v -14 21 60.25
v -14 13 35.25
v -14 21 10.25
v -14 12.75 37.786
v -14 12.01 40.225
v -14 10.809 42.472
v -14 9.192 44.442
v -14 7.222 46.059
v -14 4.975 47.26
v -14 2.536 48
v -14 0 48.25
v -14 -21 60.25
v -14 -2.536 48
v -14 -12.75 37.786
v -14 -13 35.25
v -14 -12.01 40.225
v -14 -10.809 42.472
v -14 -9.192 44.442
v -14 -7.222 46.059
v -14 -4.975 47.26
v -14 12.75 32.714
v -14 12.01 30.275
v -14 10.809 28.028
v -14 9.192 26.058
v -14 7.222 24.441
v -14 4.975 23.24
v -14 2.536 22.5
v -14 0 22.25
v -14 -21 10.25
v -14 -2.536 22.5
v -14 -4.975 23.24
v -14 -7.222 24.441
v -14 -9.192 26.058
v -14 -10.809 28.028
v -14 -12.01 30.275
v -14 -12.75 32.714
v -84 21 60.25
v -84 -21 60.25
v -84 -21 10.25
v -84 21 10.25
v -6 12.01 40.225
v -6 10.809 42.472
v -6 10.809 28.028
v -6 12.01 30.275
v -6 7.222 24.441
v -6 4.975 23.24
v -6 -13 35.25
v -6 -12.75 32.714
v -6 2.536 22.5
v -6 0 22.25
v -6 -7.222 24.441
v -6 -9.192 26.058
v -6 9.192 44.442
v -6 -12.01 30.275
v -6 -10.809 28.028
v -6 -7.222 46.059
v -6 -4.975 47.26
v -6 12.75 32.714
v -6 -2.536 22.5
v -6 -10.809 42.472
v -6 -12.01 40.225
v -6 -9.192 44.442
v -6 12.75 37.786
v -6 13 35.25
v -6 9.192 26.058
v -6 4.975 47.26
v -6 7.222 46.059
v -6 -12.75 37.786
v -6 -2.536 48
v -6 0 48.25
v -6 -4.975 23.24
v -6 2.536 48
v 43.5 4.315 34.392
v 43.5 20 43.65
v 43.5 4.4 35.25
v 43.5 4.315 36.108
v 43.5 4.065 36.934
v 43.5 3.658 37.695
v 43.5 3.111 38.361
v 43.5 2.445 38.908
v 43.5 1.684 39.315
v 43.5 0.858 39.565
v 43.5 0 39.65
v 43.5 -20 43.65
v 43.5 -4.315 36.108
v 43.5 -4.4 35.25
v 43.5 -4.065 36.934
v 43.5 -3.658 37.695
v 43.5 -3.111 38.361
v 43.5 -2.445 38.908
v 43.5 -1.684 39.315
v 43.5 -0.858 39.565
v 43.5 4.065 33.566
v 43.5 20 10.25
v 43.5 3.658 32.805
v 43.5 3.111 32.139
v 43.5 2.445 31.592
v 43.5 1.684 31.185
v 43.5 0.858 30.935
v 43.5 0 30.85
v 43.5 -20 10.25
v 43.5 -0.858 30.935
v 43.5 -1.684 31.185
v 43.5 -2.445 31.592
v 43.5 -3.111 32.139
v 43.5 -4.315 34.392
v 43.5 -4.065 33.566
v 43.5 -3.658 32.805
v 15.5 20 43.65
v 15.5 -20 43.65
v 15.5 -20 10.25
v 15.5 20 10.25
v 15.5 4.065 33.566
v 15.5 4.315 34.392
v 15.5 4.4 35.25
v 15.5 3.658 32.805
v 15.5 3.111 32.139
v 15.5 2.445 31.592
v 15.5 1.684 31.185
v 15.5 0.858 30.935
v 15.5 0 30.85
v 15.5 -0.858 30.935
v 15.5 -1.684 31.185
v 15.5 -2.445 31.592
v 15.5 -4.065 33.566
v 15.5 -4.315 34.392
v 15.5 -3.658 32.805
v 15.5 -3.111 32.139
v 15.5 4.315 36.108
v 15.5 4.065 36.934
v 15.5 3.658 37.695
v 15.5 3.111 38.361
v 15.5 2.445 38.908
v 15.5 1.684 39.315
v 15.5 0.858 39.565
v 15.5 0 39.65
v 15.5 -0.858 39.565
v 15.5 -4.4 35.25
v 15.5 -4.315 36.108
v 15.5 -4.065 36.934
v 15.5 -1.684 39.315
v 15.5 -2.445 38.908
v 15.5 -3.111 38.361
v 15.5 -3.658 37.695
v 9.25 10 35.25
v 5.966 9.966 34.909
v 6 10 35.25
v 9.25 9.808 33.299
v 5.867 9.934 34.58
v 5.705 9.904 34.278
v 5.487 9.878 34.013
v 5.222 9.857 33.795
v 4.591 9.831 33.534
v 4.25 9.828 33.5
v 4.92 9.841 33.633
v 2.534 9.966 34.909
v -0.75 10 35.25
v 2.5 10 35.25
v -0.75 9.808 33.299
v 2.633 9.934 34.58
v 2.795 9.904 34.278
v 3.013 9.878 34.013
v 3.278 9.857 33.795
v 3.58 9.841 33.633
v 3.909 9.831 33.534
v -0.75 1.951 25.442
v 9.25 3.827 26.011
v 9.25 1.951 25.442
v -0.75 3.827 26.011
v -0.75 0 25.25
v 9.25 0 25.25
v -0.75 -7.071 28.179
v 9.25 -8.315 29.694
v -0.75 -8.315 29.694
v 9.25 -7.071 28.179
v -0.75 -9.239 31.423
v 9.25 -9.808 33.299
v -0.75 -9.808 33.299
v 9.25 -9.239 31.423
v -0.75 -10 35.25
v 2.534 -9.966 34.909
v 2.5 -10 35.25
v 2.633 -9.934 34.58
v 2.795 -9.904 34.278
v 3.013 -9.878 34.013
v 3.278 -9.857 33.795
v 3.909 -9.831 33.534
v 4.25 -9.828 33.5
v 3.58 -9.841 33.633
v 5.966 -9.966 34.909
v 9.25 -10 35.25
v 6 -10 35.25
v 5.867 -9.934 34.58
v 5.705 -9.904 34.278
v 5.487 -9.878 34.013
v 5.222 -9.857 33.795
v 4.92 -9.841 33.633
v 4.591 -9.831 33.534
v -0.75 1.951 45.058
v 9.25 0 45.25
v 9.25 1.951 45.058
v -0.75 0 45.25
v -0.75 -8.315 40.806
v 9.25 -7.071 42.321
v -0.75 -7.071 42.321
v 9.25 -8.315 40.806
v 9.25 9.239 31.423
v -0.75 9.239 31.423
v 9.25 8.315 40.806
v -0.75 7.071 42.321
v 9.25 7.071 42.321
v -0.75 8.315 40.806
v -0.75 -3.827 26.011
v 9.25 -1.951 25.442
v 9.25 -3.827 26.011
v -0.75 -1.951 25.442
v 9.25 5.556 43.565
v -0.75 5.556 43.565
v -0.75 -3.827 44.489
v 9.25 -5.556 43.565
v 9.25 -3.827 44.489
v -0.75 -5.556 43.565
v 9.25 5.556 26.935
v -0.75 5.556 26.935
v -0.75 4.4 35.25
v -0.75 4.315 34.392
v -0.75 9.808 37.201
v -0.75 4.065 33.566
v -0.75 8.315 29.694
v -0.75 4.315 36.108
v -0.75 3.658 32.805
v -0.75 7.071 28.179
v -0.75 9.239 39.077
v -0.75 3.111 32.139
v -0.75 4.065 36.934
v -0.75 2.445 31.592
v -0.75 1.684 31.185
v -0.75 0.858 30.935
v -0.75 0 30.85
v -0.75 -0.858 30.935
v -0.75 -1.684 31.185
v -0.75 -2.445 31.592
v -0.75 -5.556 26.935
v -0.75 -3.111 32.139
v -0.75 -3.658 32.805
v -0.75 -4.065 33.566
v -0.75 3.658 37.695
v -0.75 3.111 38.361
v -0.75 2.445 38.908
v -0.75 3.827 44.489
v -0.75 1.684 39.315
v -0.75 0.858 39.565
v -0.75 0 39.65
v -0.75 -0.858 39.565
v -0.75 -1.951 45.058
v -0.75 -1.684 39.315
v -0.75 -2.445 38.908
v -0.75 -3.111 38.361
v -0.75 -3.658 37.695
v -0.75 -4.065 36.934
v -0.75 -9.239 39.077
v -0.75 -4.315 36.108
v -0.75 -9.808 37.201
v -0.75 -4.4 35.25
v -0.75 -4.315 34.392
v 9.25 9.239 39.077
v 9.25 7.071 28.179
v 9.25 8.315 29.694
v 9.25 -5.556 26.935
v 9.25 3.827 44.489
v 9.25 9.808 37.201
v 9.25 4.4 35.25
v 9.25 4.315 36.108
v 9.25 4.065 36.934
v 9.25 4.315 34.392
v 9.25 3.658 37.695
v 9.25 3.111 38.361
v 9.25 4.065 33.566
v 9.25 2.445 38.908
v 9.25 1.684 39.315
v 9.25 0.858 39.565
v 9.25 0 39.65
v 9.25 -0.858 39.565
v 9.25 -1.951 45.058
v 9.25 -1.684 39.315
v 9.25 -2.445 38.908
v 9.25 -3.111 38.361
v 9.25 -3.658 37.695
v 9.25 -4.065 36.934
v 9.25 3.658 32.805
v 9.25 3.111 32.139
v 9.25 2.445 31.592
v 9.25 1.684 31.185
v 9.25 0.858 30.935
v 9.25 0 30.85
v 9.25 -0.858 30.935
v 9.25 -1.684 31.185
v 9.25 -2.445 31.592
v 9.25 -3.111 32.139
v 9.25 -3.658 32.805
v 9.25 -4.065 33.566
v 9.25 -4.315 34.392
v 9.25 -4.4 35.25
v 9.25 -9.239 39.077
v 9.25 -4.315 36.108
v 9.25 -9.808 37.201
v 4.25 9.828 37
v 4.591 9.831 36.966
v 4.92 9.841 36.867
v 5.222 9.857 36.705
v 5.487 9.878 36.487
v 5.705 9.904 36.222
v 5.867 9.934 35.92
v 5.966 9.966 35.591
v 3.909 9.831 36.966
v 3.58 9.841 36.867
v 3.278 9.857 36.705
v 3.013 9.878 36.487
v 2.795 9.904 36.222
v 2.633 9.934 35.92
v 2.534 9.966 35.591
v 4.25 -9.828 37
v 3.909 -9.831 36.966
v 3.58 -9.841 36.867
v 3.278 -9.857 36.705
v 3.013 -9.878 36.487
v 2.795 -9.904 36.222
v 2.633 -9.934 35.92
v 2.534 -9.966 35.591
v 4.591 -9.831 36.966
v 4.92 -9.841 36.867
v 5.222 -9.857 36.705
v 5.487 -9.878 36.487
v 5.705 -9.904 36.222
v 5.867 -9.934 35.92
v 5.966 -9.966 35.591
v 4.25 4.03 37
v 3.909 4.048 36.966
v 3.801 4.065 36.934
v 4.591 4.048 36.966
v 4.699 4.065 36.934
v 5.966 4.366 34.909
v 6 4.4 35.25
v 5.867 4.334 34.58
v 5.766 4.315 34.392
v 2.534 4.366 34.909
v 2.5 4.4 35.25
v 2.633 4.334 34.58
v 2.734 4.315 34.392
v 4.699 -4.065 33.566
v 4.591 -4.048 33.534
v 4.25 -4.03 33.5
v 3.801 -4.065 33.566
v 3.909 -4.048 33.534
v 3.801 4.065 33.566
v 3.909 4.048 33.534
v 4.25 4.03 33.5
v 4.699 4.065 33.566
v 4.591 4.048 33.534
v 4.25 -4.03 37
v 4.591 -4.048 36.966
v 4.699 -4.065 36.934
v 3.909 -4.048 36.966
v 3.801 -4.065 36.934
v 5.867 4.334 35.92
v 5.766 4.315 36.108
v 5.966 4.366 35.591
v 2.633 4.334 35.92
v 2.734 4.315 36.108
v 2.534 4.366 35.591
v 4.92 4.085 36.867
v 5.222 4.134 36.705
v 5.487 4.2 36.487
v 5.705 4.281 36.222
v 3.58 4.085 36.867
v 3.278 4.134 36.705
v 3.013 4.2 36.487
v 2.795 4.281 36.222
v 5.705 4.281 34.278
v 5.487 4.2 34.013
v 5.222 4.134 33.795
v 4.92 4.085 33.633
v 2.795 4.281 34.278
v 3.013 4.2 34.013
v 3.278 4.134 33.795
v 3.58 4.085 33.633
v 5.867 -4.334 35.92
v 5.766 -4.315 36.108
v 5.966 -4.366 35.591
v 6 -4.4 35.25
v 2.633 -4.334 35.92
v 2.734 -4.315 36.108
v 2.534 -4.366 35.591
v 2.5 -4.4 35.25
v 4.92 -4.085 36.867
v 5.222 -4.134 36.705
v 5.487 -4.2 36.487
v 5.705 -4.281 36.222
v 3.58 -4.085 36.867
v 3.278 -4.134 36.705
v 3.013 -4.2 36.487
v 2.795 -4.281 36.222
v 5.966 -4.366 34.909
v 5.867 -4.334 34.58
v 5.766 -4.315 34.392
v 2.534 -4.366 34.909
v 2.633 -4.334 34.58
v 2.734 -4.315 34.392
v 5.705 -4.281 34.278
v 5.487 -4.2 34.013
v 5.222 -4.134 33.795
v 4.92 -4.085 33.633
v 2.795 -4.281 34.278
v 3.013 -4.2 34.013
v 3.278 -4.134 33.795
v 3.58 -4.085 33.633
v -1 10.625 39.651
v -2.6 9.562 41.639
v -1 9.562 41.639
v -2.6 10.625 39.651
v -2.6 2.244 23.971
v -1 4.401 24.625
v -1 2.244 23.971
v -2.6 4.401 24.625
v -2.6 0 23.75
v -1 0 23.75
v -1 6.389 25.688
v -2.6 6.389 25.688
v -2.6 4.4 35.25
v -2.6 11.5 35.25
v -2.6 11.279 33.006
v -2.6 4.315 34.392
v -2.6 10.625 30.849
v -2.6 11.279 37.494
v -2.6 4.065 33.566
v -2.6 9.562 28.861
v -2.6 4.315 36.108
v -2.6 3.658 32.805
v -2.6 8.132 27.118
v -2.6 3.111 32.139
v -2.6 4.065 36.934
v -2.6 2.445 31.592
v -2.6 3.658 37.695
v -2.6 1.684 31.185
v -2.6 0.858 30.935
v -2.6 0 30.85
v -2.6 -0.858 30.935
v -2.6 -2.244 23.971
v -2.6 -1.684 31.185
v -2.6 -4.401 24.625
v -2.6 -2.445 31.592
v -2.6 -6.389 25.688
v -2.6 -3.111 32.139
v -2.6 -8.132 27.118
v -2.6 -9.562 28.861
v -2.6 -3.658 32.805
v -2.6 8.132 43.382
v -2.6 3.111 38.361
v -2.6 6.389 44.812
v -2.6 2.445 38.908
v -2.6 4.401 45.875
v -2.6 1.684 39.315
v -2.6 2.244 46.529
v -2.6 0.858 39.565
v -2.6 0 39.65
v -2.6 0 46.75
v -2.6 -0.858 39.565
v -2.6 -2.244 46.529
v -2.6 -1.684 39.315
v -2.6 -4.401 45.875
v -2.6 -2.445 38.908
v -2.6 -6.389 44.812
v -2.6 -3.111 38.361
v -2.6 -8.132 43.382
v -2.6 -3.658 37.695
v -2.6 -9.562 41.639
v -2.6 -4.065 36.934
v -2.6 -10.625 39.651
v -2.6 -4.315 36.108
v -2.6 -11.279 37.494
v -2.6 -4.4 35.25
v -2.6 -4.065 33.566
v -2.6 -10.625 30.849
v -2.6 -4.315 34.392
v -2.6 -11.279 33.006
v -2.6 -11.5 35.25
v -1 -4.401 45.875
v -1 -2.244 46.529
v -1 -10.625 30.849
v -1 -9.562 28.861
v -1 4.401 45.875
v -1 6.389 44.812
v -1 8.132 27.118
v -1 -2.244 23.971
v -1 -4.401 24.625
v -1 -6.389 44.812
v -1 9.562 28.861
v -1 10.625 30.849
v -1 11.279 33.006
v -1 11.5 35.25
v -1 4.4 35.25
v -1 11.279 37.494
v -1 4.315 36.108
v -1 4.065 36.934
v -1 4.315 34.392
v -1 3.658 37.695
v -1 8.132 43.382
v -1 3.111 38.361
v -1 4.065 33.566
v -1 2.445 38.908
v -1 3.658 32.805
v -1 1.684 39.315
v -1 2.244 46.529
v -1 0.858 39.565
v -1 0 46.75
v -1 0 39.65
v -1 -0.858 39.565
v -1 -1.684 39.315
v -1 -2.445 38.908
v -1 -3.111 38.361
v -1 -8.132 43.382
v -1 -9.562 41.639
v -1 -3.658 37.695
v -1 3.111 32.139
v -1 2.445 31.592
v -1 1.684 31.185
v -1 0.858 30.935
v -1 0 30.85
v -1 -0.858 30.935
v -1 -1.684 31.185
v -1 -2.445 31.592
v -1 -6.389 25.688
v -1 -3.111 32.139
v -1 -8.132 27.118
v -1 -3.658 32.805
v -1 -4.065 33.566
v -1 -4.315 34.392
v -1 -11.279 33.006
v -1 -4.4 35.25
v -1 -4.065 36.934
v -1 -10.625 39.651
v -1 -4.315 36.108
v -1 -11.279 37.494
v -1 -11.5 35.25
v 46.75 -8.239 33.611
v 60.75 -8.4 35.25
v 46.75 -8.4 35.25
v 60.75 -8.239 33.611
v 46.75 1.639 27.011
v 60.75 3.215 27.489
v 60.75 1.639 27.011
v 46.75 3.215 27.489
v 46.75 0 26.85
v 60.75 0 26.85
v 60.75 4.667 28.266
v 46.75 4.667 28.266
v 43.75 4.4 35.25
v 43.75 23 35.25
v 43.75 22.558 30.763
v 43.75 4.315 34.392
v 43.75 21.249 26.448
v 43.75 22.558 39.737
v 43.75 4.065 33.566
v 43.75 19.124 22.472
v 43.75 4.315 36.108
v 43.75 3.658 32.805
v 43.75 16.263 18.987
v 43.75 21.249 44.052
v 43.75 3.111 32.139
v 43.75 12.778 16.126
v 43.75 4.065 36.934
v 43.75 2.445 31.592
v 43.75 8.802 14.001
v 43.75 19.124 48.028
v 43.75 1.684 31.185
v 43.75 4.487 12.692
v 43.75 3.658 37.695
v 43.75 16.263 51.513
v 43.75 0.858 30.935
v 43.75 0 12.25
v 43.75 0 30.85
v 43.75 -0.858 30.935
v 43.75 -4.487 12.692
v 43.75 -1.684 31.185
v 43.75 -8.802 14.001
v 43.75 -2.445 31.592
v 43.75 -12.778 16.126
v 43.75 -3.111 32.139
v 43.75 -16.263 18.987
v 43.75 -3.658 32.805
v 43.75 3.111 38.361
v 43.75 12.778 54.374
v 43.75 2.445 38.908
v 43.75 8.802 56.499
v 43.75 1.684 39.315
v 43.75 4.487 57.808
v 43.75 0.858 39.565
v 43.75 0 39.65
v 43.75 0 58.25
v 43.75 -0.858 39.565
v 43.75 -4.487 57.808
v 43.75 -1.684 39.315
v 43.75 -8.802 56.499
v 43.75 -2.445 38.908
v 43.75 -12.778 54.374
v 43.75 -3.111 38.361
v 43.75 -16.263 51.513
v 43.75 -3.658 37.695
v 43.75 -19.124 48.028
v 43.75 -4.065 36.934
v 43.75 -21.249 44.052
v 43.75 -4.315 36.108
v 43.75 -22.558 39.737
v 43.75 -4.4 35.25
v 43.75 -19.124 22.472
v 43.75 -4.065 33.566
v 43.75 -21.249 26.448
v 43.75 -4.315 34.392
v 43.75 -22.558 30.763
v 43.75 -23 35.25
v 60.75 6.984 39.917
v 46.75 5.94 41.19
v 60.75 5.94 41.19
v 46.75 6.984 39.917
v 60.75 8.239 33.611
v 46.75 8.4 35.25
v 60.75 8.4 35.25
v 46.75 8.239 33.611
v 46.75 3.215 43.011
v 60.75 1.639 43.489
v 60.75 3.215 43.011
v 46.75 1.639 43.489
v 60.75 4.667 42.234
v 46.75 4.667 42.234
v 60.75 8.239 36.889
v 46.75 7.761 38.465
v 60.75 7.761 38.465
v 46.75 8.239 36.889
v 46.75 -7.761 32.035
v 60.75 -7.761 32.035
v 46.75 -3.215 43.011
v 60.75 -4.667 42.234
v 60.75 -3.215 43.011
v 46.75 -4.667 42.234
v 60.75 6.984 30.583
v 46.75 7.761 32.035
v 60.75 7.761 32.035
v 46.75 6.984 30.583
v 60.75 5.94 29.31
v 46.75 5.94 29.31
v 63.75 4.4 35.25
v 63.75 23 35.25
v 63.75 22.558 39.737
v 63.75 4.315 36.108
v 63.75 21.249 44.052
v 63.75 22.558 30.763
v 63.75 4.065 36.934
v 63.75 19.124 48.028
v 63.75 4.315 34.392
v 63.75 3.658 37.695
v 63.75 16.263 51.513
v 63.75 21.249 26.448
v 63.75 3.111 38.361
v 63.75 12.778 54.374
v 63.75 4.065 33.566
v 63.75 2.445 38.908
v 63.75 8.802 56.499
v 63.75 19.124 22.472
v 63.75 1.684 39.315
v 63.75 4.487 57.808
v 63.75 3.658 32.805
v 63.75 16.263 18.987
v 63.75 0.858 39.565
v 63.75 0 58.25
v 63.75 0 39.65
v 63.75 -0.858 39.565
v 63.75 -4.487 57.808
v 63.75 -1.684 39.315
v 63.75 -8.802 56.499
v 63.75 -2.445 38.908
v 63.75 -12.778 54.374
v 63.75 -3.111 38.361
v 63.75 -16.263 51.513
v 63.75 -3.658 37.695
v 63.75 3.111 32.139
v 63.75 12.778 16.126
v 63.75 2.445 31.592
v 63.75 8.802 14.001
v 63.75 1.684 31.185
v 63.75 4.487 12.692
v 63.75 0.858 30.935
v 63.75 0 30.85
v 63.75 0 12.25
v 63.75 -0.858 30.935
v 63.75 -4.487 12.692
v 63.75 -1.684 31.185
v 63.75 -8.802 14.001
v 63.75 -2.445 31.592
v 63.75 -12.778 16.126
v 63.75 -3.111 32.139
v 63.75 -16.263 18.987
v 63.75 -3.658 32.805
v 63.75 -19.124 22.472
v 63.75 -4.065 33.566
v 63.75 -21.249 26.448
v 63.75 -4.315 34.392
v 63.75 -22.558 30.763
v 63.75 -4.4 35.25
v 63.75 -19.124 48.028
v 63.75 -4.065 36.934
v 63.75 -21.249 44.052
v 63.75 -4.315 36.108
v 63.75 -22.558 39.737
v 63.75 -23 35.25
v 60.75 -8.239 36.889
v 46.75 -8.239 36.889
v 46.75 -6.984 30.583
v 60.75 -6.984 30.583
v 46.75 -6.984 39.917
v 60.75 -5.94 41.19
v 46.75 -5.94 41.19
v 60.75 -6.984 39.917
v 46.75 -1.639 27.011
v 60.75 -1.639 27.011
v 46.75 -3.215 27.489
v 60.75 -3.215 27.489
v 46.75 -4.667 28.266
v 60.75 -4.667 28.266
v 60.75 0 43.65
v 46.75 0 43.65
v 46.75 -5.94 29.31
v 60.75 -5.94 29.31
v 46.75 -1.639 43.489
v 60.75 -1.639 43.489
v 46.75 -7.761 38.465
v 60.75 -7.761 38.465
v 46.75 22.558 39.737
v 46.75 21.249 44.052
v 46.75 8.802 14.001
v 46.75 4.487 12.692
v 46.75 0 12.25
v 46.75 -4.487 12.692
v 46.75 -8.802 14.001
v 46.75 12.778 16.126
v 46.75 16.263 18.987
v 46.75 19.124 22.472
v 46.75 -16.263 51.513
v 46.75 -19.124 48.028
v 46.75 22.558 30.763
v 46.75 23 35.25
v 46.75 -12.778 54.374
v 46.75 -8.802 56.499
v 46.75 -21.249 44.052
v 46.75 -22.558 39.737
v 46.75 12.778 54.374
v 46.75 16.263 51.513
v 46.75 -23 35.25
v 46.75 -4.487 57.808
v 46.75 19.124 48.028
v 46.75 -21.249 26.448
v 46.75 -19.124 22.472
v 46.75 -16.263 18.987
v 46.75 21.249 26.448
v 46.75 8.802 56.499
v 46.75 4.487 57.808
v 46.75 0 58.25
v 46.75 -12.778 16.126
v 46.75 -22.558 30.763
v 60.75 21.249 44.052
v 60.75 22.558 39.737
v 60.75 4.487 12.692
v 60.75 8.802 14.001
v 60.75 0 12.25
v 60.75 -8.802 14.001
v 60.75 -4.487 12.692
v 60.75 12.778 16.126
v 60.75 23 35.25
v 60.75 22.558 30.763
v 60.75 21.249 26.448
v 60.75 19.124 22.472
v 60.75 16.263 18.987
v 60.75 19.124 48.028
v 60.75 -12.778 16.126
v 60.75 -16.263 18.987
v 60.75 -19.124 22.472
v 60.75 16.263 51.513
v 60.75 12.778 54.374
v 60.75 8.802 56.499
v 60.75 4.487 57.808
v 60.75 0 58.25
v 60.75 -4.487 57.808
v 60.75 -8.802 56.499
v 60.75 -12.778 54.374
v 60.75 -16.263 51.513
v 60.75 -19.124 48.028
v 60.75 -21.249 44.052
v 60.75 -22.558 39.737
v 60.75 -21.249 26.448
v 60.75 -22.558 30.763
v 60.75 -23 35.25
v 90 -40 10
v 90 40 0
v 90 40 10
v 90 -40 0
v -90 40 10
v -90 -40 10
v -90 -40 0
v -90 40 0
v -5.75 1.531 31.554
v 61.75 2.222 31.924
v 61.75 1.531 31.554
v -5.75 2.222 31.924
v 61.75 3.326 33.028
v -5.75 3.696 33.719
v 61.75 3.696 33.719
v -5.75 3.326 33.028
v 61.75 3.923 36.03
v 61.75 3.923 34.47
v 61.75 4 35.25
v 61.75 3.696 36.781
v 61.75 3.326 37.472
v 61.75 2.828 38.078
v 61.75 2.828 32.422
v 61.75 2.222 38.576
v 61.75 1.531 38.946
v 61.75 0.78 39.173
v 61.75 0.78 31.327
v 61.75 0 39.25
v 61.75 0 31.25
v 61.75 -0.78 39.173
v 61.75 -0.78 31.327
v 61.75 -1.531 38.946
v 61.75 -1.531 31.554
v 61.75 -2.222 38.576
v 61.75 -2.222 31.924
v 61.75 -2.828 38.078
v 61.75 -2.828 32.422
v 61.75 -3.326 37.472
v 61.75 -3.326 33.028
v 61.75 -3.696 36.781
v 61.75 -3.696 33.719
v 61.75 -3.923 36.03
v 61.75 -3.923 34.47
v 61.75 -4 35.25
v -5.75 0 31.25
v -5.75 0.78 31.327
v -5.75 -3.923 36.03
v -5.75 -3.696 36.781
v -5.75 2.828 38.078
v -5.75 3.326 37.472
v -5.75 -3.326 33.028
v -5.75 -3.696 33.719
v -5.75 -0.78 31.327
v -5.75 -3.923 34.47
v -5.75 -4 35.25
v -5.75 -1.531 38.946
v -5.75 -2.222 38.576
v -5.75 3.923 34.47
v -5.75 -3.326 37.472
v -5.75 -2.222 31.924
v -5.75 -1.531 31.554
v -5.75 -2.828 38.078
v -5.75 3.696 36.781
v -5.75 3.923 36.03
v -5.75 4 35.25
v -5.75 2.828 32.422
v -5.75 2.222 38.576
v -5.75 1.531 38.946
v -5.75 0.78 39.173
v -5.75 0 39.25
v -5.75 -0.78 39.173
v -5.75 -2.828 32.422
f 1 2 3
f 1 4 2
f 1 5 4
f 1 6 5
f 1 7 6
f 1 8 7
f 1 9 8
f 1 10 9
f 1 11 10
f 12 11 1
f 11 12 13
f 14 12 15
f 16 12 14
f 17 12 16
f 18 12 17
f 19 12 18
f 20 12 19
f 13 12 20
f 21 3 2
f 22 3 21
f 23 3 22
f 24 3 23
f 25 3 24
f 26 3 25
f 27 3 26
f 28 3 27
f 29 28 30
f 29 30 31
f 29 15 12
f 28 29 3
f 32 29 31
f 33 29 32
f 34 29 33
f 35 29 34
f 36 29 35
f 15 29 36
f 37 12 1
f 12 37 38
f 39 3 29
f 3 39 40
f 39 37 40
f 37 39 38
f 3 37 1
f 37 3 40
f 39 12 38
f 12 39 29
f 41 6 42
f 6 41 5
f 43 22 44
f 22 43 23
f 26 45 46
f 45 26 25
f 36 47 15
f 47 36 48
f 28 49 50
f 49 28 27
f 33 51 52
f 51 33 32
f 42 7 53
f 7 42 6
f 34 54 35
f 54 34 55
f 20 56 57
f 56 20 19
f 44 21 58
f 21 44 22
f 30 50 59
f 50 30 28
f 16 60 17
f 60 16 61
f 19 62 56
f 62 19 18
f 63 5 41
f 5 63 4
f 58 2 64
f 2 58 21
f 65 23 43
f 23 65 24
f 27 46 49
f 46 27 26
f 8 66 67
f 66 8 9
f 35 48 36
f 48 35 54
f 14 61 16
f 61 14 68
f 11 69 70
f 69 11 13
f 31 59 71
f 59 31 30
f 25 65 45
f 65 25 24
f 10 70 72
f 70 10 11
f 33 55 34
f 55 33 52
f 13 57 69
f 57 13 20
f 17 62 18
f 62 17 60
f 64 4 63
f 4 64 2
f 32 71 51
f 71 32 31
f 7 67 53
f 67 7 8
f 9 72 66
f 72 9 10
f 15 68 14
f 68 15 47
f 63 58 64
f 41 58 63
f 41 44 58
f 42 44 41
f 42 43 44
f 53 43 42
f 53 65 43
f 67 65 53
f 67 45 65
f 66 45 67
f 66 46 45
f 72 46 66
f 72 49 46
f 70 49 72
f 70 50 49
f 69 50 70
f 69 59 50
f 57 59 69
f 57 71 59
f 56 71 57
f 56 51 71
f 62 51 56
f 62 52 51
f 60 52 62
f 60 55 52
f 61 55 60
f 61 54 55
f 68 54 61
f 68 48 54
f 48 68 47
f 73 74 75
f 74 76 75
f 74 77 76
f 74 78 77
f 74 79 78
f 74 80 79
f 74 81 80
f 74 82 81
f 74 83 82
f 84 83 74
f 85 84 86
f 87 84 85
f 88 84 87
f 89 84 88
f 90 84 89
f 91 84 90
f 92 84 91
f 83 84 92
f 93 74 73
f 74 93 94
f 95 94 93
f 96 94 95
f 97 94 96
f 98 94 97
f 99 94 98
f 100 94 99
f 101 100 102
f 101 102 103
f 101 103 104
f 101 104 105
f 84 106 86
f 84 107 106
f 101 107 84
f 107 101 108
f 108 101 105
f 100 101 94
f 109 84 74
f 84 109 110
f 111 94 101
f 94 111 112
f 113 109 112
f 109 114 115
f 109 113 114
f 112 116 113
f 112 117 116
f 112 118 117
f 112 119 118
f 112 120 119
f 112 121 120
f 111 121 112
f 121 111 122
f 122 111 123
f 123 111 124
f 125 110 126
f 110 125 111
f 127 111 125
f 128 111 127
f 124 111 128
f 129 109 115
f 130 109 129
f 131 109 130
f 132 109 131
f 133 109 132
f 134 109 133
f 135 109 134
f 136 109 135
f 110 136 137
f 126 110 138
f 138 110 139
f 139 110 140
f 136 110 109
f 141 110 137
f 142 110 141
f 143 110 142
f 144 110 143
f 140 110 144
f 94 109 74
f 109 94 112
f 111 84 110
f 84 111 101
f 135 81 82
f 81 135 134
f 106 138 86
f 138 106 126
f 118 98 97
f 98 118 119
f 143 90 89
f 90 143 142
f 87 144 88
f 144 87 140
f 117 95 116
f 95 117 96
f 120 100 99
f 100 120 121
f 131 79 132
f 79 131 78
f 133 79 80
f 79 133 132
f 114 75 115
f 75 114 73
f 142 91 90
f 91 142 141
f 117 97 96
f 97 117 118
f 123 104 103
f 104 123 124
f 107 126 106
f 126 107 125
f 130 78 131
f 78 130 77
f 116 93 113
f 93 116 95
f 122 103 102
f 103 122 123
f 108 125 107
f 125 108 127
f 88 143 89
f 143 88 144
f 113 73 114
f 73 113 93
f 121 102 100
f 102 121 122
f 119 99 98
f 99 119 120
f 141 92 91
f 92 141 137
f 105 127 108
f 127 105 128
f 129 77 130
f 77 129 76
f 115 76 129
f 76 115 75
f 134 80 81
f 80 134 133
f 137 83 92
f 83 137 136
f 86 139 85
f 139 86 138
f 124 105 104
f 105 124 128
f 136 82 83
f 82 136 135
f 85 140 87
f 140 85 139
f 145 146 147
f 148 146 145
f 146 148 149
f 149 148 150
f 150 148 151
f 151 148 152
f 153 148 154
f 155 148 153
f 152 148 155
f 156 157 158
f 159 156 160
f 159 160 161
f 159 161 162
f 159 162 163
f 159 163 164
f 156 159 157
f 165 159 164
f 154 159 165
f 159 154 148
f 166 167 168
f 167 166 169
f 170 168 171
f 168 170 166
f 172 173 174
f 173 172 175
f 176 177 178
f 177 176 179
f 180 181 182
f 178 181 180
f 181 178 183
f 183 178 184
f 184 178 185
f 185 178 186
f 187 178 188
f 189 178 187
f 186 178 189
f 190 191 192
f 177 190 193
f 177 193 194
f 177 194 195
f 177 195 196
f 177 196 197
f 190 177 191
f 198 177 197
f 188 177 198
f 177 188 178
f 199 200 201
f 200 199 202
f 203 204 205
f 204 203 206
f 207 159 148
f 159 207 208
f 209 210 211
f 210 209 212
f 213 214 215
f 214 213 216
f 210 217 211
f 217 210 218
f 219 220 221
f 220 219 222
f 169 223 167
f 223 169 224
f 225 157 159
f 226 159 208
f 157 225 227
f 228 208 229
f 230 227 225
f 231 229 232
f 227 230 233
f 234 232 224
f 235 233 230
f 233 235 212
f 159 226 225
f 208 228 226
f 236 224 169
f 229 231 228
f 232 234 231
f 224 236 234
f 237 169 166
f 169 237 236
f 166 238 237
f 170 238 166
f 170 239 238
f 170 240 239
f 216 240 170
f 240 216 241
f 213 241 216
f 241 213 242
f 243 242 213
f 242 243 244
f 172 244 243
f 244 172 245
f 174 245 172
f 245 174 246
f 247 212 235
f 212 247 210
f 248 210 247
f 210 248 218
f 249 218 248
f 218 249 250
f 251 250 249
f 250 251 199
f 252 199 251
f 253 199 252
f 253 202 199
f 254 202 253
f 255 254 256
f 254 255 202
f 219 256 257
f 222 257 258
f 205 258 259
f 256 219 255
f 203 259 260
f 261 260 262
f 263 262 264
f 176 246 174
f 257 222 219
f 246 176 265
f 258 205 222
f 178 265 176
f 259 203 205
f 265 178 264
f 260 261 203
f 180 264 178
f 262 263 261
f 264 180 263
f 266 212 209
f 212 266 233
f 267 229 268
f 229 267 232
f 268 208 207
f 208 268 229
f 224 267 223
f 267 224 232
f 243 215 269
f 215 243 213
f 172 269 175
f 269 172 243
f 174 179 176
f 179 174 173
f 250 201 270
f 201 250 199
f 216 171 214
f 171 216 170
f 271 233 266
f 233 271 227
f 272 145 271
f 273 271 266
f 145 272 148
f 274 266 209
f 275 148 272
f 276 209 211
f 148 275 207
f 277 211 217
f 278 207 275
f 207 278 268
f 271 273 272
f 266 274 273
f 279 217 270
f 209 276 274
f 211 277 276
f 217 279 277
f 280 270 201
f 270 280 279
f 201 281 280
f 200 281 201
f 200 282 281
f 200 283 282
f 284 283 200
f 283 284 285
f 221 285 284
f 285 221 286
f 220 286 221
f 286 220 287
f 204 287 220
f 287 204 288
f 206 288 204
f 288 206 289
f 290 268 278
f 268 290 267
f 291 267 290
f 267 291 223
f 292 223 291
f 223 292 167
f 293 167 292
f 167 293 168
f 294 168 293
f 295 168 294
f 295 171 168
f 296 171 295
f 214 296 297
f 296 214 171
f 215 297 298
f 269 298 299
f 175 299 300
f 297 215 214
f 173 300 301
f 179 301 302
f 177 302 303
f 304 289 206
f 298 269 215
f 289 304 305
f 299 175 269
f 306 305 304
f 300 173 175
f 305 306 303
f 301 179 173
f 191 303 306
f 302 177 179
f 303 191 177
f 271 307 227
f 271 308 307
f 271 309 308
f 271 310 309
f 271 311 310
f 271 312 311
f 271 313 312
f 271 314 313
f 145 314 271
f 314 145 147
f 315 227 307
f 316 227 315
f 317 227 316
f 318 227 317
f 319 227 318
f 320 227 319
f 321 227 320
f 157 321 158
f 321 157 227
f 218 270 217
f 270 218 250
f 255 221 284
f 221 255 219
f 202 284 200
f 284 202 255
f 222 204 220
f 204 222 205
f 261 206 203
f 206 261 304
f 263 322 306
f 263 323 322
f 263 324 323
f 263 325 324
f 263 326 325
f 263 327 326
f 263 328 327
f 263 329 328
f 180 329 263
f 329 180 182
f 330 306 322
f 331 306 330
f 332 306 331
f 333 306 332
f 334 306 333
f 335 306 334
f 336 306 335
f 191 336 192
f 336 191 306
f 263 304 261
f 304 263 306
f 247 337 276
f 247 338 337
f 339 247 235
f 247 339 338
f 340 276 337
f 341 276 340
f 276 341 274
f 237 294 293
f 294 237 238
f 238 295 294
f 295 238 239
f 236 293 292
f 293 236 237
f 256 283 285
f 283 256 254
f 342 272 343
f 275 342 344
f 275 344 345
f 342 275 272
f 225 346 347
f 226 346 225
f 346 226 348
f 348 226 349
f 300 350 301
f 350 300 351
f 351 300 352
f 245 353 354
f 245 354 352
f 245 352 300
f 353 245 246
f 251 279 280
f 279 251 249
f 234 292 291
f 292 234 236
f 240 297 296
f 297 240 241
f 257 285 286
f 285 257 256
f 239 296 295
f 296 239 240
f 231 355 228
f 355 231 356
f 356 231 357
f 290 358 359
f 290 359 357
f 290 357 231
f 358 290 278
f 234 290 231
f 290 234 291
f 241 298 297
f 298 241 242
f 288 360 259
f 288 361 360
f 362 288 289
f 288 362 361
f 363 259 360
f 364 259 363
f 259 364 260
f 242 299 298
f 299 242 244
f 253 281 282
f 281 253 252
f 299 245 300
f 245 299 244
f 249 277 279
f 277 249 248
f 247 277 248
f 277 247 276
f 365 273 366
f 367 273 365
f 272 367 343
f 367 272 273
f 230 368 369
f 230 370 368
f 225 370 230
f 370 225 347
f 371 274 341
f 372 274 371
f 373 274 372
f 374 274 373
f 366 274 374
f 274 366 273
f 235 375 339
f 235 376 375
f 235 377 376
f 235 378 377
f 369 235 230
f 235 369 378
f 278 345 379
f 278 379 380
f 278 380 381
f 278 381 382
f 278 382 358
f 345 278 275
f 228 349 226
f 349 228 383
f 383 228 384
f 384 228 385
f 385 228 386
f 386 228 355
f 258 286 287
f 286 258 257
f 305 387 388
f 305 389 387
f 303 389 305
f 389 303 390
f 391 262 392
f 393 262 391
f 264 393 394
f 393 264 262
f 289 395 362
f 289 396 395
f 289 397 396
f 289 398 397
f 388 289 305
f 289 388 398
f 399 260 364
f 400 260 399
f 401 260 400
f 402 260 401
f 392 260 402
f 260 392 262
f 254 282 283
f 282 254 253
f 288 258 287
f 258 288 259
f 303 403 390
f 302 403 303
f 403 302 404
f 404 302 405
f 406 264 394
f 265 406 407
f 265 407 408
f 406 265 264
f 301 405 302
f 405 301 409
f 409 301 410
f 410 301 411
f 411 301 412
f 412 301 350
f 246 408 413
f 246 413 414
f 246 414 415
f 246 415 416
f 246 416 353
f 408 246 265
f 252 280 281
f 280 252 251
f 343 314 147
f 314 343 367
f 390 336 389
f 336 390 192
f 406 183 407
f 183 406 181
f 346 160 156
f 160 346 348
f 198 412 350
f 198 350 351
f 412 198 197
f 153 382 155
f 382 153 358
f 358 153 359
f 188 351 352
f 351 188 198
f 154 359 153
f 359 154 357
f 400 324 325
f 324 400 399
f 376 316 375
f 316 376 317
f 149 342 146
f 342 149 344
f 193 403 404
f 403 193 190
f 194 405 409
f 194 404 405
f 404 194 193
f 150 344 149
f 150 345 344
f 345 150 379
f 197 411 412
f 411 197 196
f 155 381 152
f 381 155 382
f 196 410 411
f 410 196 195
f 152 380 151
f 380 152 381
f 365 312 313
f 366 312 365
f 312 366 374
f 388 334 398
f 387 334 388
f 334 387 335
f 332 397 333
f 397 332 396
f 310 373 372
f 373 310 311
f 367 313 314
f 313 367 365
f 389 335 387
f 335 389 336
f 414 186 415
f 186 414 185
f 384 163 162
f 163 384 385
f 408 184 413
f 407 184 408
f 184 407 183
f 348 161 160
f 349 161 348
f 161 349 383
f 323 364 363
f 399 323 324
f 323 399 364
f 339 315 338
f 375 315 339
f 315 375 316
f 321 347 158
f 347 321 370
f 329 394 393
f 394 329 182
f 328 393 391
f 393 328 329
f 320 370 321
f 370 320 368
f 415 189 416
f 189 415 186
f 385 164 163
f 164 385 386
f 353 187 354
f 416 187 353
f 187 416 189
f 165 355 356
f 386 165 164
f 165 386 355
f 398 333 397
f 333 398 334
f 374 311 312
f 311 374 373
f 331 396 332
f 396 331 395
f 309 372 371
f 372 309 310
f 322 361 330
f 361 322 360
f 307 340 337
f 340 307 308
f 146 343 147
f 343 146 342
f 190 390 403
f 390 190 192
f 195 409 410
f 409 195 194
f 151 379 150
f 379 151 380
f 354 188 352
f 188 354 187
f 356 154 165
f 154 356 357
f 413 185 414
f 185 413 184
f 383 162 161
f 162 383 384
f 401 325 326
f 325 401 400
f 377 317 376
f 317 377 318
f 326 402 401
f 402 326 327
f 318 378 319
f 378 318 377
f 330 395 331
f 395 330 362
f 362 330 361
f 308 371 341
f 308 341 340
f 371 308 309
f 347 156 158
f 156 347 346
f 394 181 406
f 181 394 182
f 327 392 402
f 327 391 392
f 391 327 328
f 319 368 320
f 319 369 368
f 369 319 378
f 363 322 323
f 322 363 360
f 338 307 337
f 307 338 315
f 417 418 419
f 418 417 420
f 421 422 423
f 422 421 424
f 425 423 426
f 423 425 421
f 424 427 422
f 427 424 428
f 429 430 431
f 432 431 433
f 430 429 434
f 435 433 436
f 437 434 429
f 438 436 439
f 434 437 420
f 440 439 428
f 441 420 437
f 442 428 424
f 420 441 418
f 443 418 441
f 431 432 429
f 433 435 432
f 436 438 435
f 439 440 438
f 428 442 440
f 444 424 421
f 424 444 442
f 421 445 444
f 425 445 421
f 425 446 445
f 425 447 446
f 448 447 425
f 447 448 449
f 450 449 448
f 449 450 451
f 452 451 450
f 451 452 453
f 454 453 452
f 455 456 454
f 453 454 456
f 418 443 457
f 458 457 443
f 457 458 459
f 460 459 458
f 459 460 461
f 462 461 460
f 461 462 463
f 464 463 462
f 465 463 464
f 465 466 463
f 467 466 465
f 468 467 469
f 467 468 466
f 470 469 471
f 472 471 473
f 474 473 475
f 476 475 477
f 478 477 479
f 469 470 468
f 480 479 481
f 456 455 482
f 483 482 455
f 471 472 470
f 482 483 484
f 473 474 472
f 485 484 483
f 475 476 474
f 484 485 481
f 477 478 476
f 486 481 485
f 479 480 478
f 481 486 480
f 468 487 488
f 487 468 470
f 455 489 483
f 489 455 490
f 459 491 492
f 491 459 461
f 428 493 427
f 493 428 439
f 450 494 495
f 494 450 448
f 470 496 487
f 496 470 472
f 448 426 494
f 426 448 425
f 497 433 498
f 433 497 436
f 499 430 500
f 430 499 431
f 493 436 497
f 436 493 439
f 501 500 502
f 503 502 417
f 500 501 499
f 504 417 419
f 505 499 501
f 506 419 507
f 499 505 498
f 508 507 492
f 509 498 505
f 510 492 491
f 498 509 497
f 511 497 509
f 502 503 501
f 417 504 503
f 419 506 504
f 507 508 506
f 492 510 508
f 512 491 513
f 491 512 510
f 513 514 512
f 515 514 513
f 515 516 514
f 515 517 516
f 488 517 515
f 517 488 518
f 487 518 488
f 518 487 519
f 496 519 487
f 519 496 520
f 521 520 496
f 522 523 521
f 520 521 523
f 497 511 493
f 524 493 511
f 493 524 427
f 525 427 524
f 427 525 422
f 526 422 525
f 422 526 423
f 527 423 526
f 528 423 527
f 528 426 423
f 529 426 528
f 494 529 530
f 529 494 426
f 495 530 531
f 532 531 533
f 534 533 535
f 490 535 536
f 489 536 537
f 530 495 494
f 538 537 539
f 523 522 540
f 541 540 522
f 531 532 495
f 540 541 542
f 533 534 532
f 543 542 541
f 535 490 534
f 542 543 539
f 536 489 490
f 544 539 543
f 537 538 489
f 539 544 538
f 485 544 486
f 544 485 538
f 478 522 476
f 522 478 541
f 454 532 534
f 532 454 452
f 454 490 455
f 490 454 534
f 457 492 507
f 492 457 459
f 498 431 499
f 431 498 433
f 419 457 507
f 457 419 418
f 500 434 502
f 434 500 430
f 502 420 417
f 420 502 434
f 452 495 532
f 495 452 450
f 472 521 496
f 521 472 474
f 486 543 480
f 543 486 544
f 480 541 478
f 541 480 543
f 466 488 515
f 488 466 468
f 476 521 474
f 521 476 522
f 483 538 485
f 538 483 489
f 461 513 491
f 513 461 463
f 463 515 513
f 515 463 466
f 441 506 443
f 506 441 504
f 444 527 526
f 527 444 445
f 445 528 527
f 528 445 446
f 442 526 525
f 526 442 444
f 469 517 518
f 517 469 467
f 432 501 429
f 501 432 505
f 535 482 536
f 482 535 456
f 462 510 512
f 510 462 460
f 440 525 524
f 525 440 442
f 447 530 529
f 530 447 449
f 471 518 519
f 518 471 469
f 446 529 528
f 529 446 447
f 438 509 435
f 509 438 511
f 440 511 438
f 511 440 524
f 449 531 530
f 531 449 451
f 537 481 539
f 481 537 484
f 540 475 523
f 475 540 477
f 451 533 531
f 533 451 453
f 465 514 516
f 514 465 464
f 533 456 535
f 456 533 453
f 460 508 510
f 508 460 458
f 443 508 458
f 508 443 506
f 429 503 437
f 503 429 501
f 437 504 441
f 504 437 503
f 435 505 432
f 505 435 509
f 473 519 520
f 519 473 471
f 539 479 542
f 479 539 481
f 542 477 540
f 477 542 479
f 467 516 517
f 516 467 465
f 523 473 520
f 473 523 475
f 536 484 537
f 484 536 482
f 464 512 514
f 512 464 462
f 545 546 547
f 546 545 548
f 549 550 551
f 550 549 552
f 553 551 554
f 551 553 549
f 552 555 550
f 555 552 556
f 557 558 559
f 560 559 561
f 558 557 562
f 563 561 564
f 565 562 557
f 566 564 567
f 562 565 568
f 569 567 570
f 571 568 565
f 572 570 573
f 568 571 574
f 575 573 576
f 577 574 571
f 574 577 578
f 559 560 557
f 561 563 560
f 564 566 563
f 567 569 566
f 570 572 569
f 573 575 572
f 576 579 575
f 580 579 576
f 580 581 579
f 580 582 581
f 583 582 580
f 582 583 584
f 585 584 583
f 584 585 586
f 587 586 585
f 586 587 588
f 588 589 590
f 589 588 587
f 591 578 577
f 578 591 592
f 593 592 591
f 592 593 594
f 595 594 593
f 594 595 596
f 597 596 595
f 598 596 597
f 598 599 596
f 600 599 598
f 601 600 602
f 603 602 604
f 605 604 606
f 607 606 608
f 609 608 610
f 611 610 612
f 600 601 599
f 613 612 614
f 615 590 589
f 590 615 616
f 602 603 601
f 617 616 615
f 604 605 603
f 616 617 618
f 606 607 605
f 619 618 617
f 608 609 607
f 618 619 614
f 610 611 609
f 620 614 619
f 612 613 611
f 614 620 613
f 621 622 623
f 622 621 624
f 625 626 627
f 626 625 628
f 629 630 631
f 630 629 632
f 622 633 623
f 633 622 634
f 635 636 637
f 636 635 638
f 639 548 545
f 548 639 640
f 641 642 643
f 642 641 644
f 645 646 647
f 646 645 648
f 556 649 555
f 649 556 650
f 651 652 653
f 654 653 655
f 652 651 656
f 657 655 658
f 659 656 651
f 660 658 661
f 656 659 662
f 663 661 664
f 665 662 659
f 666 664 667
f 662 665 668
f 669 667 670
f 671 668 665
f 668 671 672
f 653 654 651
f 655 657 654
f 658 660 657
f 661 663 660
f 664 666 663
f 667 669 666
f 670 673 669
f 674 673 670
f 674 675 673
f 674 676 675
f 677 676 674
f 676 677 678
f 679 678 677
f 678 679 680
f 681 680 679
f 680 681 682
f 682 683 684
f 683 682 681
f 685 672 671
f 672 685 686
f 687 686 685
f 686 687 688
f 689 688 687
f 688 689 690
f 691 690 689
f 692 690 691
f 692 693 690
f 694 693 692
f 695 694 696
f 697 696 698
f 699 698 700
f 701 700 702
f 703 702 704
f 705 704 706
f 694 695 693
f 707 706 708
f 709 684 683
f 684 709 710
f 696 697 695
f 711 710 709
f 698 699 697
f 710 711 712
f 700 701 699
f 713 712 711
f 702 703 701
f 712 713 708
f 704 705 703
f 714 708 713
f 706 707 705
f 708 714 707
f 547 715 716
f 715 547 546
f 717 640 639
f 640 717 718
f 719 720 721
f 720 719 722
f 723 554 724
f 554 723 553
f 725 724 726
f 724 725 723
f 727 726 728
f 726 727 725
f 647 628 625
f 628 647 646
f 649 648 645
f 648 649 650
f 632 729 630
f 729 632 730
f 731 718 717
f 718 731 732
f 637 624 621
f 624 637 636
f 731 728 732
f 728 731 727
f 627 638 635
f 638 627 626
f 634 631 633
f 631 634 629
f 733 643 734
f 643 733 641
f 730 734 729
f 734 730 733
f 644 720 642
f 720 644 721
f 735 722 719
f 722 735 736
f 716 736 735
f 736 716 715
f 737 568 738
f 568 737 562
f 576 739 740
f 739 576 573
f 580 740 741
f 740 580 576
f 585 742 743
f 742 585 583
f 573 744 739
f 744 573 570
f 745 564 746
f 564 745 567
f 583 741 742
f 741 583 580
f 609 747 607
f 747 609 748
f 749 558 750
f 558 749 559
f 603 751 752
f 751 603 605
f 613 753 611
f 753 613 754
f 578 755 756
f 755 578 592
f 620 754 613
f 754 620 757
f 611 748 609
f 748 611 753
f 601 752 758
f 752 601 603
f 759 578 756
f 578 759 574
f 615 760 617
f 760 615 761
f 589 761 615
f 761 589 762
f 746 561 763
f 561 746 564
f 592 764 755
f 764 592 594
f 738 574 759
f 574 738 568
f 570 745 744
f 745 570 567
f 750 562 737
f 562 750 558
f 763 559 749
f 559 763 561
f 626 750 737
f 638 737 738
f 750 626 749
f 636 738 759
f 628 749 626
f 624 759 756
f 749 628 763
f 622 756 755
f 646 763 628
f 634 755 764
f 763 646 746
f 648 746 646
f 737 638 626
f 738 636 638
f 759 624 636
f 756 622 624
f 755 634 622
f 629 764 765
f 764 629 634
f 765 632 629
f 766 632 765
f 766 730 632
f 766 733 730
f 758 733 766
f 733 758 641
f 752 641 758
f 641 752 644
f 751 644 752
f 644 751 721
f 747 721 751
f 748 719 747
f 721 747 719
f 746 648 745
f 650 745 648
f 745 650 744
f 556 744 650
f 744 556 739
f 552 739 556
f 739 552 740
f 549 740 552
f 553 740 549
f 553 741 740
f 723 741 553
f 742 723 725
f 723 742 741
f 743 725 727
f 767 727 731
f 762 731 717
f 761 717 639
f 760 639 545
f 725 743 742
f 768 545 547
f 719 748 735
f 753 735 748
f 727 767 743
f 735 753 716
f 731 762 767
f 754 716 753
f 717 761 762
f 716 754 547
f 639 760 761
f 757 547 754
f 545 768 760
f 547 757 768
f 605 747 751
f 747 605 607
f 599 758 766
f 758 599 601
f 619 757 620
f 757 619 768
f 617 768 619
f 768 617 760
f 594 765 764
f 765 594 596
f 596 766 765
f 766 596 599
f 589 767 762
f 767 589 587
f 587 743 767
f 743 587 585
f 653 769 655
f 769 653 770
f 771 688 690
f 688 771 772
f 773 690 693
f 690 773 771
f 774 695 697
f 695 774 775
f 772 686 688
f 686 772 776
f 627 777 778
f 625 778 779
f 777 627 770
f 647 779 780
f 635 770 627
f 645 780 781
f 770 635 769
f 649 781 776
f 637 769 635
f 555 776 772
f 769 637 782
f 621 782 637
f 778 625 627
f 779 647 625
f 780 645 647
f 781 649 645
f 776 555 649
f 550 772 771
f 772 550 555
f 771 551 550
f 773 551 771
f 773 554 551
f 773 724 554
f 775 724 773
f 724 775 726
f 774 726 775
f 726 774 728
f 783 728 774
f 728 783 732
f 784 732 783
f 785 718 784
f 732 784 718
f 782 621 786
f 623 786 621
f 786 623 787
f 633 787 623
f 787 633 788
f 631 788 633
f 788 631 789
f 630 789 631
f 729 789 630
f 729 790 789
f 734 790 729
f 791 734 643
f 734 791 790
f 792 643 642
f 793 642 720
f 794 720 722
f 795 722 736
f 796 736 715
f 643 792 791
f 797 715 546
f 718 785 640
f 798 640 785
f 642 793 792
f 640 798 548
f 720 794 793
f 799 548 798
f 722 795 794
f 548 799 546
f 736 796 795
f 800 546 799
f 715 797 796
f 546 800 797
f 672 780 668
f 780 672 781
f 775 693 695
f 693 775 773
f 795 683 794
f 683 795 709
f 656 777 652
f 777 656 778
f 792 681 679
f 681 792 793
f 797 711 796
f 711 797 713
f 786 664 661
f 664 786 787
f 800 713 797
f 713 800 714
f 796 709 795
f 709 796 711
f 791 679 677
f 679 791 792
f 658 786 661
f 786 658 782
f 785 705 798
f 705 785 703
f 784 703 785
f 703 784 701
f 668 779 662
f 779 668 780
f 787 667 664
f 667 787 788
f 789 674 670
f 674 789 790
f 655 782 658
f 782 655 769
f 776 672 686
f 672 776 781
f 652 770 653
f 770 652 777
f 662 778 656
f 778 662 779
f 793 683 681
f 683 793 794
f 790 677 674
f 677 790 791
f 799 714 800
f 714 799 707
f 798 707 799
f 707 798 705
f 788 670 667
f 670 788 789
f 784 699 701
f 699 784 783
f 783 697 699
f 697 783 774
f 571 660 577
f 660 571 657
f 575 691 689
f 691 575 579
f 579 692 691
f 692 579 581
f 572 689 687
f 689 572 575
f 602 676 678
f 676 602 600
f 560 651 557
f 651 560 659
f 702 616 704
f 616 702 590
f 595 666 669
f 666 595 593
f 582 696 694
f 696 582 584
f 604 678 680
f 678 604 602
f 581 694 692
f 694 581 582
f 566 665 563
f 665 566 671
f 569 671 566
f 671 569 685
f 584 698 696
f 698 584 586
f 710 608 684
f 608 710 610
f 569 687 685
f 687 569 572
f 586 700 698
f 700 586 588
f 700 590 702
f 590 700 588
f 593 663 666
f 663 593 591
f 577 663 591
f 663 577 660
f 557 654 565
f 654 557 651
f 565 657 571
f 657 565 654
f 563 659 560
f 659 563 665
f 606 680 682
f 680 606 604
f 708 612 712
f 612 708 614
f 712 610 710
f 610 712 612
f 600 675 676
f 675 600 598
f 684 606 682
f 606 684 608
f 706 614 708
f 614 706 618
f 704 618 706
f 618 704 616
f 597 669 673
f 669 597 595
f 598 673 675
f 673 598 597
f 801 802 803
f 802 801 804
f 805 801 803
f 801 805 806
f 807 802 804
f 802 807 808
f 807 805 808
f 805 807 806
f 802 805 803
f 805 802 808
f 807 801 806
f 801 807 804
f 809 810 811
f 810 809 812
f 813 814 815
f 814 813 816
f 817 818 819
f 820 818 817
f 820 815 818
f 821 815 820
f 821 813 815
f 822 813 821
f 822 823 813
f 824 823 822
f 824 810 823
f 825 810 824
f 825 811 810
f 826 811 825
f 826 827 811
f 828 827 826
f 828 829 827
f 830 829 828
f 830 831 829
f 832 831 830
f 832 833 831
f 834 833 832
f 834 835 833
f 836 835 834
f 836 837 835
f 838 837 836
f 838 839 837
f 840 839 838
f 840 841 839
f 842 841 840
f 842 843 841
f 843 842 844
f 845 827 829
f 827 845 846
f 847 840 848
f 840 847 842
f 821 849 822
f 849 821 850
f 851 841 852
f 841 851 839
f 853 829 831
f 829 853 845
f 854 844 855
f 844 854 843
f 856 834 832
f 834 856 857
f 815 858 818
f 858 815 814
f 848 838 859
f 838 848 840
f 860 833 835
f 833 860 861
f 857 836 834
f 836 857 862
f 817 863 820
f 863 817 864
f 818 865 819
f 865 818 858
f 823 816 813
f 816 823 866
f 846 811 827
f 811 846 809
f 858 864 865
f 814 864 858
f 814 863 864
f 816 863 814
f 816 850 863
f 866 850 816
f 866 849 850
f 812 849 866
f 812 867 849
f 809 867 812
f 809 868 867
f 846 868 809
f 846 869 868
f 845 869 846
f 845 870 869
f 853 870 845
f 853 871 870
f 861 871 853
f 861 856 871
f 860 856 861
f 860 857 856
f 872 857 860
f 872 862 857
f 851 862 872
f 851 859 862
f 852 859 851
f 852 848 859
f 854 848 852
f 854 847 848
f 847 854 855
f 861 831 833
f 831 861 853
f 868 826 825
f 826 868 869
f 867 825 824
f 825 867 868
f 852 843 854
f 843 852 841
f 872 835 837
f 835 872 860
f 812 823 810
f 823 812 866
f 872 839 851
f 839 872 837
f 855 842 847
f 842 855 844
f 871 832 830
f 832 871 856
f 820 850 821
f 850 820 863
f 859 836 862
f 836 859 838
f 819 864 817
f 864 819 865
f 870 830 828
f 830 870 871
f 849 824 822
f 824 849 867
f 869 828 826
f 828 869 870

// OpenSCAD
$fn = 32;

// ------------------------------------------------------------------------
// Motor drive station: motor 70 x 50 mm, shaft d8, pulley d46
// Every part is its own module, assembly() places every instance.
// ------------------------------------------------------------------------

// --- part 1 ---
module station_bed() {
  difference() {
    translate([-90, -40, 0]) cube([180, 80, 10]);
  }
}

// --- part 2 ---
module drive_motor() {
  union() {
    translate([-35, -21, 0]) cube([70, 42, 50]);
    translate([39, 0, 25]) rotate([0, 90, 0]) cylinder(h = 8, d = 26, center = true);
  }
}

// --- part 3 ---
module pillow_block() {
  difference() {
    translate([-14, -20, 0]) cube([28, 40, 33.4]);
    translate([0, 0, 25]) rotate([0, 90, 0]) cylinder(h = 30, d = 8.8, center = true);
  }
}

// --- part 4 ---
module drive_shaft() {
  translate([0, 0, -33.75]) cylinder(h = 67.5, d = 8);
}

// --- part 5 ---
module shaft_collar() {
  difference() {
    cylinder(h = 10, d = 20);
    translate([0, 0, -1]) cylinder(h = 12, d = 8.8);
    translate([0, 0, 5]) rotate([90, 0, 0]) cylinder(h = 22, d = 3.5, center = true);
  }
}

// --- part 6 ---
module collar_washer() {
  difference() {
      translate([0, 0, 0]) cylinder(h = 1.6, d = 23);
      translate([0, 0, -1]) cylinder(h = 3.6, d = 8.8);
    }
}

// --- part 7 ---
module drive_pulley() {
  difference() {
    union() {
      cylinder(h = 20, d = 16.8);
      cylinder(h = 3, d = 46);
      translate([0, 0, 17]) cylinder(h = 3, d = 46);
    }
    translate([0, 0, -1]) cylinder(h = 22, d = 8.8);
  }
}

// --- assembly ---
module assembly() {
  color([0.80, 0.24, 0.20]) translate([0, 0, 0]) rotate([0, 0, 0]) station_bed();
  color([0.20, 0.45, 0.75]) translate([-49, 0, 10.25]) rotate([0, 0, 0]) drive_motor();
  color([0.25, 0.62, 0.32]) translate([29.5, 0, 10.25]) rotate([0, 0, 0]) pillow_block();
  color([0.92, 0.70, 0.18]) translate([28, 0, 35.25]) rotate([0, 90, 0]) drive_shaft();
  color([0.58, 0.35, 0.70]) translate([-0.75, 0, 35.25]) rotate([0, 90, 0]) shaft_collar();
  color([0.16, 0.66, 0.66]) translate([-2.6, 0, 35.25]) rotate([0, 90, 0]) collar_washer();
  color([0.85, 0.48, 0.18]) translate([43.75, 0, 35.25]) rotate([0, 90, 0]) drive_pulley();
}

assembly();
